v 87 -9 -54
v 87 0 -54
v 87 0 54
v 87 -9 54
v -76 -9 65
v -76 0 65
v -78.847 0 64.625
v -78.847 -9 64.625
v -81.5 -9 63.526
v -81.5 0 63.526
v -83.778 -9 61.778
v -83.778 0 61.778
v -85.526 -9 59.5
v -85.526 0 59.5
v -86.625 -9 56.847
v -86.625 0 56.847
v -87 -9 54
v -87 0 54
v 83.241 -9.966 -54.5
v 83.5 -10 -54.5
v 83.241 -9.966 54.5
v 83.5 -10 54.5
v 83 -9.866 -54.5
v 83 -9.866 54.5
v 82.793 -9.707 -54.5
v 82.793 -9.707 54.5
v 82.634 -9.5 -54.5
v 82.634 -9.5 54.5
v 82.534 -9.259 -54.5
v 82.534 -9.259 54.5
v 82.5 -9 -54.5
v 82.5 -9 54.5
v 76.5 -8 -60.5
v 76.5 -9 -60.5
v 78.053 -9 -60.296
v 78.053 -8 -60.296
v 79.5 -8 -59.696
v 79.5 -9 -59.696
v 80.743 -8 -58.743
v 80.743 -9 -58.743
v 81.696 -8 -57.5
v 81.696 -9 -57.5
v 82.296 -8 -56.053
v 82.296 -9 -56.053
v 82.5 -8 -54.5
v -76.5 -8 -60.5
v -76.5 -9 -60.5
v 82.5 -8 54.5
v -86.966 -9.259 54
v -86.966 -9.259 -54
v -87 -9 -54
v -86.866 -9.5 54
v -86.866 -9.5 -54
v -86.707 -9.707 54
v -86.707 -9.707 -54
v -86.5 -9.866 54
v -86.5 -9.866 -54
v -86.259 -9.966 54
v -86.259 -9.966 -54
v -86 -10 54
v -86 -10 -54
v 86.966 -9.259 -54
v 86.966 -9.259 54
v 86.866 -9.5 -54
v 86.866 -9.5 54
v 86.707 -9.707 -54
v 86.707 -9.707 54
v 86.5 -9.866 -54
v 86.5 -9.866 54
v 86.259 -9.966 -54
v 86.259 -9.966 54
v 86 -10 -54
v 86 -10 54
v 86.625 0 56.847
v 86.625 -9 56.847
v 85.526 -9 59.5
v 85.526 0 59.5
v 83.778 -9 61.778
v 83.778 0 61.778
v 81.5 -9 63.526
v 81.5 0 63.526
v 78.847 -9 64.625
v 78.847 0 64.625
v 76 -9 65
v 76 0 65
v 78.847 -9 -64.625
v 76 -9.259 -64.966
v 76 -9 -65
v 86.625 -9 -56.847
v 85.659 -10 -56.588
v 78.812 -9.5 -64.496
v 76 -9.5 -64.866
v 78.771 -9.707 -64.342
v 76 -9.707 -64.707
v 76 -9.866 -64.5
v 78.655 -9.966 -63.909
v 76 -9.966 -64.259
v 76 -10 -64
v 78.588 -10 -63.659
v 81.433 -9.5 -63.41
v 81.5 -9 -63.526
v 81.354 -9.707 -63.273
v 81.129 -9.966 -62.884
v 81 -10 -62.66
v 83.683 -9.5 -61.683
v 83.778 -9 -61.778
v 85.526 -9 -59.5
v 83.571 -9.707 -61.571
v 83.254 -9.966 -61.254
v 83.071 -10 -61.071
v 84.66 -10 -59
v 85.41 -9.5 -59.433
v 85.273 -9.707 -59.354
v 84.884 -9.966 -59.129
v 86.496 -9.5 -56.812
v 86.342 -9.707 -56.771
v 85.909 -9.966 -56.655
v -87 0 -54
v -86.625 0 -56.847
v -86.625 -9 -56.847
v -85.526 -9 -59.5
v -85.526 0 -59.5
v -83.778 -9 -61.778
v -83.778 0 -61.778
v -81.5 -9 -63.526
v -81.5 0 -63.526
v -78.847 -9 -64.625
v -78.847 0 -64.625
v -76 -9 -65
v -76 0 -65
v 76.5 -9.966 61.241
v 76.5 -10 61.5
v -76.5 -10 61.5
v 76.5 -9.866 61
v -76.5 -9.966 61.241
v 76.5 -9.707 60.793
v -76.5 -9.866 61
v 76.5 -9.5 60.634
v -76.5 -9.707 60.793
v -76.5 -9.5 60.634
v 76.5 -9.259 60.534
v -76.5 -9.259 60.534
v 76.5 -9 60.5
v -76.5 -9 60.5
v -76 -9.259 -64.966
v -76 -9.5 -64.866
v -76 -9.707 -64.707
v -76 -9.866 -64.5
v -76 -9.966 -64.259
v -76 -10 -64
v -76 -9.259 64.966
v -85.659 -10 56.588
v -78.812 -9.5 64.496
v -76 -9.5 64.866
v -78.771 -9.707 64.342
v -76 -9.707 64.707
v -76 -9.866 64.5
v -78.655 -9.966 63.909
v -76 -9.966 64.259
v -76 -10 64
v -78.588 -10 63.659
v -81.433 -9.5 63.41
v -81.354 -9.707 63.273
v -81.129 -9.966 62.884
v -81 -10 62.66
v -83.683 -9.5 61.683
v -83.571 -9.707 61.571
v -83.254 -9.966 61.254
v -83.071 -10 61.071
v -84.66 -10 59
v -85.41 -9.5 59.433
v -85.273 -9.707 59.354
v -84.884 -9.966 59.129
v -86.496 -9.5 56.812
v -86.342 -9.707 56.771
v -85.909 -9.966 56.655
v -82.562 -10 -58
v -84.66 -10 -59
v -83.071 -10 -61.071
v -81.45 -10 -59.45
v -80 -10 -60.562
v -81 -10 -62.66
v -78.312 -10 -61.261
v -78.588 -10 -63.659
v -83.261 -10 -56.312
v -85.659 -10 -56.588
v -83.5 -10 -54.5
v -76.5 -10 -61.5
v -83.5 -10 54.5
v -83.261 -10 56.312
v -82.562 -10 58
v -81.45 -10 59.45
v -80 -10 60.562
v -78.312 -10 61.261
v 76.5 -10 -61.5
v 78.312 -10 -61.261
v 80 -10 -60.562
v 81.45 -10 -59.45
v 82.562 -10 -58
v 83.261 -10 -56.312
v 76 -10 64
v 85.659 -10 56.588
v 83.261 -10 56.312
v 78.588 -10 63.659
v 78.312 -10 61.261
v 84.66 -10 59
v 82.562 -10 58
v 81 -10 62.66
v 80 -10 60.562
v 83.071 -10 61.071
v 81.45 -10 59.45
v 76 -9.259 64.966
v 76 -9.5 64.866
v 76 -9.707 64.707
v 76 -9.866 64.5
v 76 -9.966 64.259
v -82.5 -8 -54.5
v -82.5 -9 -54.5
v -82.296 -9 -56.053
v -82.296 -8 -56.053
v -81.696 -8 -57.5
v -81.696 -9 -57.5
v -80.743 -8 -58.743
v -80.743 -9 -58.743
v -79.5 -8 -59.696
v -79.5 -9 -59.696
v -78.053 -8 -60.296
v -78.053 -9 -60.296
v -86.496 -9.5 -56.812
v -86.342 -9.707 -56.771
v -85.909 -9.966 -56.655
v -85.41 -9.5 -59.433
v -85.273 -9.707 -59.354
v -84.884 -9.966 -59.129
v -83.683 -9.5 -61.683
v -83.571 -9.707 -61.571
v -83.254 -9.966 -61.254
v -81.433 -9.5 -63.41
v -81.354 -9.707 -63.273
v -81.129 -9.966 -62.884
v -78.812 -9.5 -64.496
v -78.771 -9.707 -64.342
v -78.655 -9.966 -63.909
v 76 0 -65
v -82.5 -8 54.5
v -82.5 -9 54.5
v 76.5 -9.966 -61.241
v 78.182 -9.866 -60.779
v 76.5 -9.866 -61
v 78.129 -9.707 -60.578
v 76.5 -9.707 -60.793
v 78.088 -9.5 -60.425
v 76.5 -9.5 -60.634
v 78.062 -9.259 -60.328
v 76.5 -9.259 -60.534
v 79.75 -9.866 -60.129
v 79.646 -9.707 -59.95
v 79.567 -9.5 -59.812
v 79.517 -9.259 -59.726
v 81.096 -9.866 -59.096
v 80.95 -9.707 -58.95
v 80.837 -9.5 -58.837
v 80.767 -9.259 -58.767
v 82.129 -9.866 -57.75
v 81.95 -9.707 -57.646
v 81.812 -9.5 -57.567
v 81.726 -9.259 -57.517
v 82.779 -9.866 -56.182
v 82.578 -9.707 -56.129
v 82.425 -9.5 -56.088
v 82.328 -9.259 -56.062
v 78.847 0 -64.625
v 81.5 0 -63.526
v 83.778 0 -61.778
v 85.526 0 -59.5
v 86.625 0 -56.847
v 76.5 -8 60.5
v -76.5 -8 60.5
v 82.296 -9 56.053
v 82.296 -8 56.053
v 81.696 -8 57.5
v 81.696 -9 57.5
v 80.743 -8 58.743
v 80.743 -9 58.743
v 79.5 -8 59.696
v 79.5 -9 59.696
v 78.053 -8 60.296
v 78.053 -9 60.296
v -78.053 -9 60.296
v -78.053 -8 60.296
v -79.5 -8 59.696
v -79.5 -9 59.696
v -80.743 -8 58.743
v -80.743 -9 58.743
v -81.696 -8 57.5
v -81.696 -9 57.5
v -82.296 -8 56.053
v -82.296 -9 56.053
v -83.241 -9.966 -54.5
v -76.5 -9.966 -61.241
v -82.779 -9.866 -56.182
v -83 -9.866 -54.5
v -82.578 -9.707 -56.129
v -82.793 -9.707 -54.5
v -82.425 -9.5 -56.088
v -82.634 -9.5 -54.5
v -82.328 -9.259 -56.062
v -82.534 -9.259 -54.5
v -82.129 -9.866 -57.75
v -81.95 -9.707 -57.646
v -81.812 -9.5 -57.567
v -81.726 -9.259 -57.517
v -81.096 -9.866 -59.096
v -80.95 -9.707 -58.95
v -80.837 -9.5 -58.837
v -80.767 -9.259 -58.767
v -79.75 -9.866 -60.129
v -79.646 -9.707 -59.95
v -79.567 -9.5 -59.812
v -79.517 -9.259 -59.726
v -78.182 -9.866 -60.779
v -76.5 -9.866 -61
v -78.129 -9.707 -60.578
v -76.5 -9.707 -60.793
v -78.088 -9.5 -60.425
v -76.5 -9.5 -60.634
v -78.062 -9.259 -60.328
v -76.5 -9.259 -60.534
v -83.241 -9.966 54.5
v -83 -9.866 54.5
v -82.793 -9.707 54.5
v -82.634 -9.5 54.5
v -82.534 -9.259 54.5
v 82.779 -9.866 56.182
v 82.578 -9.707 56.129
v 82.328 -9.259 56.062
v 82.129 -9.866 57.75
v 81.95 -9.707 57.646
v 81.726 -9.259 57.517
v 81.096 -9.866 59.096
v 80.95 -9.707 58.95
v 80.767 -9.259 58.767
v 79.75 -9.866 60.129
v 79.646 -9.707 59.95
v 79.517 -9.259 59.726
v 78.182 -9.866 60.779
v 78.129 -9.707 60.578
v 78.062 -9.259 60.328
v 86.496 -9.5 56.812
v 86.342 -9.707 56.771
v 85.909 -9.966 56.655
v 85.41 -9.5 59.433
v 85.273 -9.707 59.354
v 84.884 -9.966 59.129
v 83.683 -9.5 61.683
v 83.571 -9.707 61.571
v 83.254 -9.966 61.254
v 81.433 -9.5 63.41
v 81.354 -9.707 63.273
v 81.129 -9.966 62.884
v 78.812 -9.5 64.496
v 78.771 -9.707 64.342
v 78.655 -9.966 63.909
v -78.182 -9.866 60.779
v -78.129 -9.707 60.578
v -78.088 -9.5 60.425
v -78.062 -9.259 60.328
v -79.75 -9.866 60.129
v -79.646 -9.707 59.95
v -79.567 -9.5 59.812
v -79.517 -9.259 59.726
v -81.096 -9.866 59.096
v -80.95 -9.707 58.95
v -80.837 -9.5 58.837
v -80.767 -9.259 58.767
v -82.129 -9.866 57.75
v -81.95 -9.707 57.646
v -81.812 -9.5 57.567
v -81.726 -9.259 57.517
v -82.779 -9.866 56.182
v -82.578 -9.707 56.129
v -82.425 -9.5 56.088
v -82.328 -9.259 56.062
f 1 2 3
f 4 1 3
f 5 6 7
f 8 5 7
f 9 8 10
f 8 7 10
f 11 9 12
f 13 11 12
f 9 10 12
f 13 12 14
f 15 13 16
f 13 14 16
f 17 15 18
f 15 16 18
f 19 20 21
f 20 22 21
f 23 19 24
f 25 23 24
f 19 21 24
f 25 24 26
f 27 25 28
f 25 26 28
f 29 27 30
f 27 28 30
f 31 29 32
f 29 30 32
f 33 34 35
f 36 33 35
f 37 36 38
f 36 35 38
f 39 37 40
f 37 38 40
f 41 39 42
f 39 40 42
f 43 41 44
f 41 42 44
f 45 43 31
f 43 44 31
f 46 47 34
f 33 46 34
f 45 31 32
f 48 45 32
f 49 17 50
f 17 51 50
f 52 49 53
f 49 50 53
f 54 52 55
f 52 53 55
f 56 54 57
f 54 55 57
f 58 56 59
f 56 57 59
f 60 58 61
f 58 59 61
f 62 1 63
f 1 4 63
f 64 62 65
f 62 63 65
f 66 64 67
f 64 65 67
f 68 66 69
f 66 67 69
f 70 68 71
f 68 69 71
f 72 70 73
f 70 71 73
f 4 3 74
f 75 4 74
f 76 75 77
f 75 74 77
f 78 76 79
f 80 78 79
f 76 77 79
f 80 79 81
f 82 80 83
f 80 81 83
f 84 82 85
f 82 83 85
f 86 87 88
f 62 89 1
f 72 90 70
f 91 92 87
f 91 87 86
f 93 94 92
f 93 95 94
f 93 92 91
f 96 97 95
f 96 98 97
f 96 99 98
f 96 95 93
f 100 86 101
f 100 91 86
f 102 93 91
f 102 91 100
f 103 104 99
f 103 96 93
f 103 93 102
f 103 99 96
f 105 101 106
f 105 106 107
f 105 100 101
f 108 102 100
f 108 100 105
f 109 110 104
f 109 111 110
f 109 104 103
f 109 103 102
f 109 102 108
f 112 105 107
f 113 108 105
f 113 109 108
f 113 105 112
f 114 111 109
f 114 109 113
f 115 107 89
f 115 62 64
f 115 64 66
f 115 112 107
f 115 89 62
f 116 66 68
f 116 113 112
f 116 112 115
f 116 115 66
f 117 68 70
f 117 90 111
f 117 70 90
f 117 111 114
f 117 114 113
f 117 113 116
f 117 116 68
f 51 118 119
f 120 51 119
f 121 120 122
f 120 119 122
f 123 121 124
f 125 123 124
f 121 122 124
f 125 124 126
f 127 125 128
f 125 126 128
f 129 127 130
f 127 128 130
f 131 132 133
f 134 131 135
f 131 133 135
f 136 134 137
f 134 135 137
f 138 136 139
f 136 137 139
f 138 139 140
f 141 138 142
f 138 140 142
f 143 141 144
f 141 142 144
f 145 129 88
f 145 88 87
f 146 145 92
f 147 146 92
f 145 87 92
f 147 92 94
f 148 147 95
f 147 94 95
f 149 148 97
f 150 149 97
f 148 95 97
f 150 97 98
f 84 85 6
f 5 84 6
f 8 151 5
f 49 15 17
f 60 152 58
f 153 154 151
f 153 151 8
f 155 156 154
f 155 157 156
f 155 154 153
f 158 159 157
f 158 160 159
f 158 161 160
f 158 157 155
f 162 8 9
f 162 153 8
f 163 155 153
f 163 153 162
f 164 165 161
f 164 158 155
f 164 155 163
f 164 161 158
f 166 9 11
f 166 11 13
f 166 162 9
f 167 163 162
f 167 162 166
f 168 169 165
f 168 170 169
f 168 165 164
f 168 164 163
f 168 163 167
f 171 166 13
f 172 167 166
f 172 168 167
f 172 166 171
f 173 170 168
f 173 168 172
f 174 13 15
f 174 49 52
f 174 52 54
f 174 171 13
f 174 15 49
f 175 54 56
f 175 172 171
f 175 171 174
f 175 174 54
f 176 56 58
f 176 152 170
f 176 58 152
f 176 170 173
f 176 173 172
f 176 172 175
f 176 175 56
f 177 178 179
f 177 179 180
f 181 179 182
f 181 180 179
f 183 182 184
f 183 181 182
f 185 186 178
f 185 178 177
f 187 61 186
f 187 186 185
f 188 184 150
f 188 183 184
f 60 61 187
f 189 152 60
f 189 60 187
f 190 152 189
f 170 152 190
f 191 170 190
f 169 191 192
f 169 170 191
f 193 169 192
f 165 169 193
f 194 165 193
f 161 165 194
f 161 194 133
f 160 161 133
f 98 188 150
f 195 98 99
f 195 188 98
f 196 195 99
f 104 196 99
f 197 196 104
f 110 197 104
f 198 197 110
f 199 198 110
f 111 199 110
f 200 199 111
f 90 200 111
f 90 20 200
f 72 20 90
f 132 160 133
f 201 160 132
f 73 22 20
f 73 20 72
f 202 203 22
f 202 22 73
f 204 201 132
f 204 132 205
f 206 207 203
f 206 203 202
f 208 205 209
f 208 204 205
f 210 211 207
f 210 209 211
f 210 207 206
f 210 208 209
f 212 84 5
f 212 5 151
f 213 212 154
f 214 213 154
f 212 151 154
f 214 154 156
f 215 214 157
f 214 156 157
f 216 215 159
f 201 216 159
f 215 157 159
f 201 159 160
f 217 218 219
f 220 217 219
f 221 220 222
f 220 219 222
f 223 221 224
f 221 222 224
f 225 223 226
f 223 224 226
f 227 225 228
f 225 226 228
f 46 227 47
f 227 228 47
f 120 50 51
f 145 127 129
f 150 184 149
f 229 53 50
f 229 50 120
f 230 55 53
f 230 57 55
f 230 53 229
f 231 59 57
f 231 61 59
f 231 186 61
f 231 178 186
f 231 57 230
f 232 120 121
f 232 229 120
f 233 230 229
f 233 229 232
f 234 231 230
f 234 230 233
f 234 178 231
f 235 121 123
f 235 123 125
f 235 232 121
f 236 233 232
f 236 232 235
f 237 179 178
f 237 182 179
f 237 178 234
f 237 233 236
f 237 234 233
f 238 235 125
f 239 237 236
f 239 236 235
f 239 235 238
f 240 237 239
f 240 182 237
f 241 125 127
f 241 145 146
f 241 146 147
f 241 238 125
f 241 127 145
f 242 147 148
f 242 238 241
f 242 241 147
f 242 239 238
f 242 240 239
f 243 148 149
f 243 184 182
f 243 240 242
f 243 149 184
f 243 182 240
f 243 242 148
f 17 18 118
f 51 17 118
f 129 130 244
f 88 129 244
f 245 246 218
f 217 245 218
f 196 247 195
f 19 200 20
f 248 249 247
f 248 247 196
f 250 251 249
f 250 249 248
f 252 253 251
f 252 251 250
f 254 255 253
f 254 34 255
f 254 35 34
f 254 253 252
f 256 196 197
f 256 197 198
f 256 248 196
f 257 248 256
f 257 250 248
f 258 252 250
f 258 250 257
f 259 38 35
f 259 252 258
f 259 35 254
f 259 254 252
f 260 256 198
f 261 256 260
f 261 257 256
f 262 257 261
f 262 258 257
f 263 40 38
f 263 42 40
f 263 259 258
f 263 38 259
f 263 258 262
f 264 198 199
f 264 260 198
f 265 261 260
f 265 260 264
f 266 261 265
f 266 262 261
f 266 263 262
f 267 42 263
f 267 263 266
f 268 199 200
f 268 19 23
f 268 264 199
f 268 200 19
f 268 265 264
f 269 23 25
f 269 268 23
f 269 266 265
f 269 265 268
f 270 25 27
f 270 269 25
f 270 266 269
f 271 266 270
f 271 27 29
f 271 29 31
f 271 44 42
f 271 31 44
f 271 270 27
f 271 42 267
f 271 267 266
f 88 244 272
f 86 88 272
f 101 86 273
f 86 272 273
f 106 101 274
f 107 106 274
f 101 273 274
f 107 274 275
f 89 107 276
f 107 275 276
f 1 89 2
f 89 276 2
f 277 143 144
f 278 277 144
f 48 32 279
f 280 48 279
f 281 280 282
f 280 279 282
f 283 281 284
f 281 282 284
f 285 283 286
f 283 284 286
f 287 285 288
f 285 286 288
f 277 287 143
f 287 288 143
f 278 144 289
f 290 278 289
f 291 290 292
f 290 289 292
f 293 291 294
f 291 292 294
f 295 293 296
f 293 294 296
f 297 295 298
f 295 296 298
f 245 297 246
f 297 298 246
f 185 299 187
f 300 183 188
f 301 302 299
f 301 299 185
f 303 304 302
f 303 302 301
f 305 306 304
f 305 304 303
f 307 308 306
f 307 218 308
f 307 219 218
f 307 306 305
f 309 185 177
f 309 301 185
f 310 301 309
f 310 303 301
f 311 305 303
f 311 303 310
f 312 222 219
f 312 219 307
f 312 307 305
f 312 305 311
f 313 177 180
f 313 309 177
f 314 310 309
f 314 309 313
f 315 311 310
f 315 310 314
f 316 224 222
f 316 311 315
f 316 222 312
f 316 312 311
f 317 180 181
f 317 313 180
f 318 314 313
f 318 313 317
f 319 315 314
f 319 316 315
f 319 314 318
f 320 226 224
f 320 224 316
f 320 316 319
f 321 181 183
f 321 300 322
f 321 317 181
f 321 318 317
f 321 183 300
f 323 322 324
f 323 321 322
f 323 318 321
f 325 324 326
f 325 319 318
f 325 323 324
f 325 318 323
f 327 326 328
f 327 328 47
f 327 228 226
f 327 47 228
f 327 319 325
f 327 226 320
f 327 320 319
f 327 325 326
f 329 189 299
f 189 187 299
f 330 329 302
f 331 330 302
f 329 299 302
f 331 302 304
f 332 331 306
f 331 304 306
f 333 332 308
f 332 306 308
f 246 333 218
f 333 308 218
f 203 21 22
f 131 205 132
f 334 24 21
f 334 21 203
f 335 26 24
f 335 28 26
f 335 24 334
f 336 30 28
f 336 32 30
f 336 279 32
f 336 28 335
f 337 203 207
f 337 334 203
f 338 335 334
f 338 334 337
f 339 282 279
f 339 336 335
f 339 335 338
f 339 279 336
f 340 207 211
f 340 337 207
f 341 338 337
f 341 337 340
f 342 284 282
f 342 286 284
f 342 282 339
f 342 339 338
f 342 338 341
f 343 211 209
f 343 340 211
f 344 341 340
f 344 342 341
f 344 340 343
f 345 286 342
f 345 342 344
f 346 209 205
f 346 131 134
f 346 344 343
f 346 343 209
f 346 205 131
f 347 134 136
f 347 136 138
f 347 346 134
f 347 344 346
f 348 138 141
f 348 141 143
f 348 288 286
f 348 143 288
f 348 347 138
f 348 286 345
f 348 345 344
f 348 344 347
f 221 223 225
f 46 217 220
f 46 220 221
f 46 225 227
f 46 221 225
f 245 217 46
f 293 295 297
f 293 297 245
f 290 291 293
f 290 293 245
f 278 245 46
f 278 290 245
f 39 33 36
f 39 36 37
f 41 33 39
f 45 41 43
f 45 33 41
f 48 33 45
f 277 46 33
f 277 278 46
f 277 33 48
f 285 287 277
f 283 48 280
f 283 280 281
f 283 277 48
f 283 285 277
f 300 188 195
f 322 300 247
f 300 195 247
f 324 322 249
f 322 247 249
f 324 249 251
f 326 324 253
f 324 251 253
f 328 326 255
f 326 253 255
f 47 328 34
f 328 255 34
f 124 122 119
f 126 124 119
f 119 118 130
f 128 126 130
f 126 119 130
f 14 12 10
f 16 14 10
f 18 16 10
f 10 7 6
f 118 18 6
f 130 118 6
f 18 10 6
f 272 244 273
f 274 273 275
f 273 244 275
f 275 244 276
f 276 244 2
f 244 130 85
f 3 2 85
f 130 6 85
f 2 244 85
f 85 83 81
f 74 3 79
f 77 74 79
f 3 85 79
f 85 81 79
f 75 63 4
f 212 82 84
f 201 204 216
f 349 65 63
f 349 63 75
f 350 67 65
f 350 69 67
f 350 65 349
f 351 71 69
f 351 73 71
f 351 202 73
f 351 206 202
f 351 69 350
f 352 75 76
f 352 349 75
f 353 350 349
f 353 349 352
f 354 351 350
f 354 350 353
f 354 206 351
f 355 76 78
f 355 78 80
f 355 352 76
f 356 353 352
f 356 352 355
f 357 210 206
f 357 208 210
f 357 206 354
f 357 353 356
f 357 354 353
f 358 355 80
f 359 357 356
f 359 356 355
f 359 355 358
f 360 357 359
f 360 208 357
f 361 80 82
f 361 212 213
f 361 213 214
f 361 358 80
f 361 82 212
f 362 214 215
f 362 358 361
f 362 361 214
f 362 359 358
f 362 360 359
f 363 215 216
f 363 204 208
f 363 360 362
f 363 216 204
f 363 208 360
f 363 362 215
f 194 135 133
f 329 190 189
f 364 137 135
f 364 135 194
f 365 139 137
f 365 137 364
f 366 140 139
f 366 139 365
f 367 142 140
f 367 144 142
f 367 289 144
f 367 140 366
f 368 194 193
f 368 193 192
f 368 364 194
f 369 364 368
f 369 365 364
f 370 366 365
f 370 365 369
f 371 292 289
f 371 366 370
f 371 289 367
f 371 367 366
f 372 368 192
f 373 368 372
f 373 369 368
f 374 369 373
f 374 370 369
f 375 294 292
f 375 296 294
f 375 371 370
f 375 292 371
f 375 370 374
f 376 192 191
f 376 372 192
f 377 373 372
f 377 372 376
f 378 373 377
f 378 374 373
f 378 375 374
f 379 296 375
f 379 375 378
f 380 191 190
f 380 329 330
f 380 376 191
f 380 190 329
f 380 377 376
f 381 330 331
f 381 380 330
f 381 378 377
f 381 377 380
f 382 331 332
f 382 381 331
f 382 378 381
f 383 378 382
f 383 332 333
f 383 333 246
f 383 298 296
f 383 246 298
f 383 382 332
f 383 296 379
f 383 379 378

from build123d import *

# Parameters (mm, degrees)
F1_DEPTH = 10
F3_DEPTH = 2
F4_R     = 1


with BuildPart() as f1:
    # F0 (on Front) → F1 (new body)
    with BuildSketch(Plane.XZ):
        with BuildLine():
            ThreePointArc((87, 54), (83.778175, 61.778175), (76, 65))
            Line((76, 65), (-76, 65))
            ThreePointArc((-76, 65), (-83.778175, 61.778175), (-87, 54))
            Line((-87, 54), (-87, -54))
            ThreePointArc((-87, -54), (-83.778175, -61.778175), (-76, -65))
            Line((-76, -65), (76, -65))
            ThreePointArc((76, -65), (83.778175, -61.778175), (87, -54))
            Line((87, -54), (87, 54))
        make_face()
        with BuildLine():
            Line((-76.5, 60.5), (76.5, 60.5))
            ThreePointArc((76.5, 60.5), (80.742641, 58.742641), (82.5, 54.5))
            Line((82.5, 54.5), (82.5, -54.5))
            ThreePointArc((82.5, -54.5), (80.742641, -58.742641), (76.5, -60.5))
            Line((76.5, -60.5), (-76.5, -60.5))
            ThreePointArc((-76.5, -60.5), (-80.742641, -58.742641), (-82.5, -54.5))
            Line((-82.5, -54.5), (-82.5, 54.5))
            ThreePointArc((-82.5, 54.5), (-80.742641, 58.742641), (-76.5, 60.5))
        make_face(mode=Mode.SUBTRACT)
        with BuildLine():
            ThreePointArc((82.5, 54.5), (80.742641, 58.742641), (76.5, 60.5))
            Line((76.5, 60.5), (-76.5, 60.5))
            ThreePointArc((-76.5, 60.5), (-80.742641, 58.742641), (-82.5, 54.5))
            Line((-82.5, 54.5), (-82.5, -54.5))
            ThreePointArc((-82.5, -54.5), (-80.742641, -58.742641), (-76.5, -60.5))
            Line((-76.5, -60.5), (76.5, -60.5))
            ThreePointArc((76.5, -60.5), (80.742641, -58.742641), (82.5, -54.5))
            Line((82.5, -54.5), (82.5, 54.5))
        make_face()
    extrude(amount=F1_DEPTH)

    # F2 (on face) → F3 (cut)
    with BuildSketch(Plane.XZ.offset(10)):
        with BuildLine():
            Line((76.5, 60.5), (-76.5, 60.5))
            ThreePointArc((-76.5, 60.5), (-80.742641, 58.742641), (-82.5, 54.5))
            Line((-82.5, 54.5), (-82.5, -54.5))
            ThreePointArc((-82.5, -54.5), (-80.742641, -58.742641), (-76.5, -60.5))
            Line((-76.5, -60.5), (76.5, -60.5))
            ThreePointArc((76.5, -60.5), (80.742641, -58.742641), (82.5, -54.5))
            Line((82.5, -54.5), (82.5, 54.5))
            ThreePointArc((82.5, 54.5), (80.742641, 58.742641), (76.5, 60.5))
        make_face()
    extrude(amount=-F3_DEPTH, mode=Mode.SUBTRACT)

    # F4
    f4_edges = [f1.edges().sort_by_distance(p)[0] for p in [
        (83.778175, -10, 61.778175),
        (87, -10, 0),
        (0, -10, 65),
        (83.778175, -10, -61.778175),
        (-83.778175, -10, 61.778175),
        (0, -10, -65),
        (-87, -10, 0),
        (-83.778175, -10, -61.778175),
        (0, -10, 60.5),
        (-80.742641, -10, 58.742641),
        (-82.5, -10, 0),
        (-80.742641, -10, -58.742641),
        (0, -10, -60.5),
        (80.742641, -10, -58.742641),
        (82.5, -10, 0),
        (80.742641, -10, 58.742641),
    ]]
    fillet(f4_edges, radius=F4_R)


solid = f1.part
